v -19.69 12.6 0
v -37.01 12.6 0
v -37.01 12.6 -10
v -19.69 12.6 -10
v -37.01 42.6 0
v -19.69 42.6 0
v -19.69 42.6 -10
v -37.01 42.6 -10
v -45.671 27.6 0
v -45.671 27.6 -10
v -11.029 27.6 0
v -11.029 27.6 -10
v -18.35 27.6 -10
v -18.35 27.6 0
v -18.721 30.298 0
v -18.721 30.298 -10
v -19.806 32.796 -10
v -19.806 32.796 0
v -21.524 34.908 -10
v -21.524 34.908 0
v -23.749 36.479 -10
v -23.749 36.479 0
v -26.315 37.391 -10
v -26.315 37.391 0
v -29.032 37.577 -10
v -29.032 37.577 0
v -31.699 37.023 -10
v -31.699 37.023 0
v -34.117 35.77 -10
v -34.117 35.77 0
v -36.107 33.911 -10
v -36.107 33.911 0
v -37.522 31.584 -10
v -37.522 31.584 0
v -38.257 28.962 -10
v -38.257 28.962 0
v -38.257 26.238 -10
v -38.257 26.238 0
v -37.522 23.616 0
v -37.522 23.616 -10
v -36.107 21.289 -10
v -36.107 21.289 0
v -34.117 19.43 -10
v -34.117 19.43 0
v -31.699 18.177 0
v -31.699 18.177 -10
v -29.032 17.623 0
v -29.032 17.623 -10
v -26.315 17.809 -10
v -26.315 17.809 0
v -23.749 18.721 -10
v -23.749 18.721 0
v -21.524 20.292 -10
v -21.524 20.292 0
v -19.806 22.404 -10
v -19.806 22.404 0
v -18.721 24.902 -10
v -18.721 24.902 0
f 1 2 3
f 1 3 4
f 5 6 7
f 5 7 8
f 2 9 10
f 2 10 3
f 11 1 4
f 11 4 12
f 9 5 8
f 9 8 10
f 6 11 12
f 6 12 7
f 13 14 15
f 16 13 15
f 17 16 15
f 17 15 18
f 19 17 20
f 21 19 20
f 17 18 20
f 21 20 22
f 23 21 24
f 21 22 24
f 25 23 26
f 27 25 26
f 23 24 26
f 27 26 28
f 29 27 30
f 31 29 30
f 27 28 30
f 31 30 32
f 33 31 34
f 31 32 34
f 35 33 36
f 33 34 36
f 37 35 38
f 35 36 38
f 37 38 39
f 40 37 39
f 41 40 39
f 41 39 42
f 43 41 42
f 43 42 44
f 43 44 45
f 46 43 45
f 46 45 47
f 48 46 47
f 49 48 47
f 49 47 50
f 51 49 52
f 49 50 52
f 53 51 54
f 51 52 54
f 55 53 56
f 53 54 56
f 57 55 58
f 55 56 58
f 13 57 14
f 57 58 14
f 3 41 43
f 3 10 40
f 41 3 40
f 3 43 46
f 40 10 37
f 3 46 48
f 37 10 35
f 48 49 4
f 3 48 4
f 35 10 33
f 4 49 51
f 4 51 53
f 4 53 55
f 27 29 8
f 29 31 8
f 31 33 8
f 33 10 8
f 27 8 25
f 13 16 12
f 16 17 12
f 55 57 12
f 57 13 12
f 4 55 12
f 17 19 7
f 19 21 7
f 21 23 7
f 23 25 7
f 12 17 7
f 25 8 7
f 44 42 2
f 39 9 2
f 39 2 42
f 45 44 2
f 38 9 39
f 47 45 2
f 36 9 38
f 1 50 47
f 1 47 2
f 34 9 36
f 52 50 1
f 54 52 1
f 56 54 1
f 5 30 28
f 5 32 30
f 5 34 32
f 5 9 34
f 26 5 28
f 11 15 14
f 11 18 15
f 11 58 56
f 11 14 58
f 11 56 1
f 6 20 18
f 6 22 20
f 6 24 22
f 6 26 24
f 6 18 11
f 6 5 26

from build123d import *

# Parameters (mm, degrees)
F0_R     = 10
F1_DEPTH = 10


with BuildPart() as f1:
    # F0 (on Top) → F1 (new body)
    with BuildSketch(Plane.XY):
        Polygon((-37.010255, 12.600002), (-19.689747, 12.600002), (-11.029493, 27.600002), (-19.689747, 42.600002), (-37.010255, 42.600002), (-45.670509, 27.600002), align=None)
        with Locations((-28.350001, 27.600002)):
            Circle(F0_R, mode=Mode.SUBTRACT)
    extrude(amount=-F1_DEPTH)


solid = f1.part
